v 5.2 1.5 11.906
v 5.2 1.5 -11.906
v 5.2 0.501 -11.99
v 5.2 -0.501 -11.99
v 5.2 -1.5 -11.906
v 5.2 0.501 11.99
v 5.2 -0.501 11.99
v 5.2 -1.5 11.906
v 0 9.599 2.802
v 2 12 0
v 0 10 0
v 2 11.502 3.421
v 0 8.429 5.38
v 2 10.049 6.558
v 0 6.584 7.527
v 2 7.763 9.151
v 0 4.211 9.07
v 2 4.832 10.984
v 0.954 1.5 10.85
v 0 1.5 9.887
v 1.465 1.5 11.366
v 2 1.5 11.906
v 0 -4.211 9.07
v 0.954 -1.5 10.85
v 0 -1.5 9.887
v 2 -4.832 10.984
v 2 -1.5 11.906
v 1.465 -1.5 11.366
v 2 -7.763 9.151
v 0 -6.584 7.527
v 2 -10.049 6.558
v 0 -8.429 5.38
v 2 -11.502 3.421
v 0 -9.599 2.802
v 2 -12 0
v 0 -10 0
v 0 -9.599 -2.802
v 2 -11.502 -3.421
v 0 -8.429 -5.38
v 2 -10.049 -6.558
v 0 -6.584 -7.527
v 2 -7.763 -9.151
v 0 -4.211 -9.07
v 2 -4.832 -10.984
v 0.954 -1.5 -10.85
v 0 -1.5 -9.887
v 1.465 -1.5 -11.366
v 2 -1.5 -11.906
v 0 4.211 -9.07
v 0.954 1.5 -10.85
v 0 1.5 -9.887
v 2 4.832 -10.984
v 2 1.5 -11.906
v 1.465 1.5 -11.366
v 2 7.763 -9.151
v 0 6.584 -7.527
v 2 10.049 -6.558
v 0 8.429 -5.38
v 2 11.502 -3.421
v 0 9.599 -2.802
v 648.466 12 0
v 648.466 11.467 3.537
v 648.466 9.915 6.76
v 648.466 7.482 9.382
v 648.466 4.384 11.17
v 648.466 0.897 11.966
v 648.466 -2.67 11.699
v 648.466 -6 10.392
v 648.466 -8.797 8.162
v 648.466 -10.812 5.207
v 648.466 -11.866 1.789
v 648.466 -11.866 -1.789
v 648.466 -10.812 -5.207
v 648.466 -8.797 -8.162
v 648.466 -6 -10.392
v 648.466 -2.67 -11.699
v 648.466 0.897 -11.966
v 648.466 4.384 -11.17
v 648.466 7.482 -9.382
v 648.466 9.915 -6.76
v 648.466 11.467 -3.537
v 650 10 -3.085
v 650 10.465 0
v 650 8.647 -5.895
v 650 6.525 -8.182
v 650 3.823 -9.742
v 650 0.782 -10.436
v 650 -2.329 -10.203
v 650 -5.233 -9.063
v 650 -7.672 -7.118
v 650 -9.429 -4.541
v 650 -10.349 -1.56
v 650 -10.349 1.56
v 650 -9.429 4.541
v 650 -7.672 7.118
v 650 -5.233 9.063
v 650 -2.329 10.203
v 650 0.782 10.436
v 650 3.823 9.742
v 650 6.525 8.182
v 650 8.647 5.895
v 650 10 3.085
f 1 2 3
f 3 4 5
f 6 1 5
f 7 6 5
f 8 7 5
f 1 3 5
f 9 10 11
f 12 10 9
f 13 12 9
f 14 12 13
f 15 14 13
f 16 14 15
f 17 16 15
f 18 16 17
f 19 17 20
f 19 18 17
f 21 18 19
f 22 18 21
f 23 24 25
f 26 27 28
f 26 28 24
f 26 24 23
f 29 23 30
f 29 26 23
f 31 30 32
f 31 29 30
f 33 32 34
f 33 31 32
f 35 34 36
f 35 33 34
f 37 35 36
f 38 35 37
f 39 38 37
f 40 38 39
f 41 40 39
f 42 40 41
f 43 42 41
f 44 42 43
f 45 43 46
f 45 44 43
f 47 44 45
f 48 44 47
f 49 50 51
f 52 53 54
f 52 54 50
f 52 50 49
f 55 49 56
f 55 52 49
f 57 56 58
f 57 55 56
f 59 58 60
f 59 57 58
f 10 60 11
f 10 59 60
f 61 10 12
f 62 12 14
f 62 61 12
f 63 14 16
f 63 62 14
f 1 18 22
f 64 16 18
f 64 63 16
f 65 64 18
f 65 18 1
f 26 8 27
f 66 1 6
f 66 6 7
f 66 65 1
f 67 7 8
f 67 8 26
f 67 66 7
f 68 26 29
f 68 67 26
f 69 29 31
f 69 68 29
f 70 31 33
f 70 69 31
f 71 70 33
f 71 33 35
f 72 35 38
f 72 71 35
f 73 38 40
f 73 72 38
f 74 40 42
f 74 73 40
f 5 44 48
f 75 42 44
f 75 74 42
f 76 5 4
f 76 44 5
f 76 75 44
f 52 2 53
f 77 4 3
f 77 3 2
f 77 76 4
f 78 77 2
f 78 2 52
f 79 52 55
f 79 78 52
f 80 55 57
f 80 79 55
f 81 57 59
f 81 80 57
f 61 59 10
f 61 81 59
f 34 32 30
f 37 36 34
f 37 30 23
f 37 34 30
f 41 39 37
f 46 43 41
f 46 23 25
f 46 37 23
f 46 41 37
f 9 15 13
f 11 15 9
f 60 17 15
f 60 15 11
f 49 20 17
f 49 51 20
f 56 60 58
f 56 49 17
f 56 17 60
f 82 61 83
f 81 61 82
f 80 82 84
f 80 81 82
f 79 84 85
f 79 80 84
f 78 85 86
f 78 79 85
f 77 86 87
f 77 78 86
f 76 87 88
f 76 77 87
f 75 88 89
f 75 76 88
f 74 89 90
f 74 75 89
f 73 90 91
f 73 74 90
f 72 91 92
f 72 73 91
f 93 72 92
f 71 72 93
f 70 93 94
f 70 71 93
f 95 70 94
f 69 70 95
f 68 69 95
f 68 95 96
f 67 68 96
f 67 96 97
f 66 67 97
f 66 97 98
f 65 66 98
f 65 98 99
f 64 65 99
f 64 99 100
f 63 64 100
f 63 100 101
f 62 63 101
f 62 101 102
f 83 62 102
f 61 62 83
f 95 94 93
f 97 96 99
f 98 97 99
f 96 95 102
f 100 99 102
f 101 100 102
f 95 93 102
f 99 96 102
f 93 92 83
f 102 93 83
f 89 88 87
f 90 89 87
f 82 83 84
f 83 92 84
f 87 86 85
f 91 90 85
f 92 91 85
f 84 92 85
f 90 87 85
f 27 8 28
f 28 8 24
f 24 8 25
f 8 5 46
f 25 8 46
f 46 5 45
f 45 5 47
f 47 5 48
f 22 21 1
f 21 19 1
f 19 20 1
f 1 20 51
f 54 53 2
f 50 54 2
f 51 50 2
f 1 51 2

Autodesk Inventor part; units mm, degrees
ref_plane "YZ Plane" through (0, 0, 0) normal (1, 0, 0) x (0, 1, 0)
sketch "Sketch1" plane through (0, 0, 0) normal (0, 0, 1) x (1, 0, 0)
  line L0 (0, 0) -> (0, 12)
  line L1 (0, 12) -> (650, 12)
  line L2 (650, 12) -> (650, 0)
  line L3 (650, 0) -> (0, 0)
  line L4 (0, 14.4) -> (0, -2.4) projected
  line L5 (-130, 0) -> (780, 0) projected
  dimension "d0" = 24
  dimension "d1" = 650
revolve "Body" add sketch "Sketch1" angle 360 about axis through (650, 0, 0) along (-1, 0, 0)
chamfer "Chamfer1" distance 1.5346 distance2 1.5336 1 edges at (650, -12, 0) measured on face at (650, -0.5646, -3.2919)
sketch "Sketch2" plane through (0, 0, 0) normal (0, 0, 1) x (1, 0, 0)
  line L0 (0, 1.5) -> (5.2, 1.5)
  line L1 (5.2, 1.5) -> (5.2, -1.5)
  line L2 (5.2, -1.5) -> (0, -1.5)
  line L3 (0, -12) -> (0, 12) projected
  line L4 (-1.04, 0) -> (6.24, 0) projected
  dimension "d7" = 1.5
  dimension "d8" = 5.2
extrude "Slot" cut sketch "Sketch2" along normal through all both and the other way through all
chamfer "Chamfer2" distance 2 angle 45 2 edges at (0, 9, 7.9373) (0, 9, -7.9373) measured on face at (0, 4.5446, 1.8536)
chamfer "Chamfer3" distance 2 angle 45 1 edges at (0, -12, 0) measured on face at (0, -7.3845, 2.2772)
ref_plane "IDS_WORKPLANE" through (626.4664, 0, 0) normal (1, 0, 0) x (0, 0, -1)
ref_plane "Work Plane2" through (325, 0, 0) normal (0, 0, -1) x (1, 0, 0)
thread "Thread2" size "M24x3" class "6g" standard "ANSI Metric M Profile" length 350
equation "\"d7\" = 0.5 * SBR"
equation "\"d8\" = STI"
equation "\"d6\" = -0.5 * GD1 + 0.5 * NND"
equation "\"d11\" = 0.1 * NND"
equation "\"d20\" = 0.1 * NND"
equation "\"d13\" = 0.1 * NND"
equation "\"d21\" = 0.1 * NND"
equation "\"GEL\" = 22"
equation "\"SBR\" = 3"
equation "\"STI\" = 5.2"
equation "\"GD1\" = THREADDIA - 1.2269 * PTC"
equation "\"GAL\" = 0.61345 * PTC"
equation "\"GUL\" = 0.61345 * PTC"
equation "\"d16\" = -GAL - GEL"
equation "\"d17\" = -GAL - GEL"
equation "\"TOA\" = 30deg"
equation "\"PTC\" = 2.5"
equation "\"NND\" = 20"
equation "\"THREADDIA\" = 20"
properties part number "DIN 427 - M20 x 60" material "Steel, Mild"
